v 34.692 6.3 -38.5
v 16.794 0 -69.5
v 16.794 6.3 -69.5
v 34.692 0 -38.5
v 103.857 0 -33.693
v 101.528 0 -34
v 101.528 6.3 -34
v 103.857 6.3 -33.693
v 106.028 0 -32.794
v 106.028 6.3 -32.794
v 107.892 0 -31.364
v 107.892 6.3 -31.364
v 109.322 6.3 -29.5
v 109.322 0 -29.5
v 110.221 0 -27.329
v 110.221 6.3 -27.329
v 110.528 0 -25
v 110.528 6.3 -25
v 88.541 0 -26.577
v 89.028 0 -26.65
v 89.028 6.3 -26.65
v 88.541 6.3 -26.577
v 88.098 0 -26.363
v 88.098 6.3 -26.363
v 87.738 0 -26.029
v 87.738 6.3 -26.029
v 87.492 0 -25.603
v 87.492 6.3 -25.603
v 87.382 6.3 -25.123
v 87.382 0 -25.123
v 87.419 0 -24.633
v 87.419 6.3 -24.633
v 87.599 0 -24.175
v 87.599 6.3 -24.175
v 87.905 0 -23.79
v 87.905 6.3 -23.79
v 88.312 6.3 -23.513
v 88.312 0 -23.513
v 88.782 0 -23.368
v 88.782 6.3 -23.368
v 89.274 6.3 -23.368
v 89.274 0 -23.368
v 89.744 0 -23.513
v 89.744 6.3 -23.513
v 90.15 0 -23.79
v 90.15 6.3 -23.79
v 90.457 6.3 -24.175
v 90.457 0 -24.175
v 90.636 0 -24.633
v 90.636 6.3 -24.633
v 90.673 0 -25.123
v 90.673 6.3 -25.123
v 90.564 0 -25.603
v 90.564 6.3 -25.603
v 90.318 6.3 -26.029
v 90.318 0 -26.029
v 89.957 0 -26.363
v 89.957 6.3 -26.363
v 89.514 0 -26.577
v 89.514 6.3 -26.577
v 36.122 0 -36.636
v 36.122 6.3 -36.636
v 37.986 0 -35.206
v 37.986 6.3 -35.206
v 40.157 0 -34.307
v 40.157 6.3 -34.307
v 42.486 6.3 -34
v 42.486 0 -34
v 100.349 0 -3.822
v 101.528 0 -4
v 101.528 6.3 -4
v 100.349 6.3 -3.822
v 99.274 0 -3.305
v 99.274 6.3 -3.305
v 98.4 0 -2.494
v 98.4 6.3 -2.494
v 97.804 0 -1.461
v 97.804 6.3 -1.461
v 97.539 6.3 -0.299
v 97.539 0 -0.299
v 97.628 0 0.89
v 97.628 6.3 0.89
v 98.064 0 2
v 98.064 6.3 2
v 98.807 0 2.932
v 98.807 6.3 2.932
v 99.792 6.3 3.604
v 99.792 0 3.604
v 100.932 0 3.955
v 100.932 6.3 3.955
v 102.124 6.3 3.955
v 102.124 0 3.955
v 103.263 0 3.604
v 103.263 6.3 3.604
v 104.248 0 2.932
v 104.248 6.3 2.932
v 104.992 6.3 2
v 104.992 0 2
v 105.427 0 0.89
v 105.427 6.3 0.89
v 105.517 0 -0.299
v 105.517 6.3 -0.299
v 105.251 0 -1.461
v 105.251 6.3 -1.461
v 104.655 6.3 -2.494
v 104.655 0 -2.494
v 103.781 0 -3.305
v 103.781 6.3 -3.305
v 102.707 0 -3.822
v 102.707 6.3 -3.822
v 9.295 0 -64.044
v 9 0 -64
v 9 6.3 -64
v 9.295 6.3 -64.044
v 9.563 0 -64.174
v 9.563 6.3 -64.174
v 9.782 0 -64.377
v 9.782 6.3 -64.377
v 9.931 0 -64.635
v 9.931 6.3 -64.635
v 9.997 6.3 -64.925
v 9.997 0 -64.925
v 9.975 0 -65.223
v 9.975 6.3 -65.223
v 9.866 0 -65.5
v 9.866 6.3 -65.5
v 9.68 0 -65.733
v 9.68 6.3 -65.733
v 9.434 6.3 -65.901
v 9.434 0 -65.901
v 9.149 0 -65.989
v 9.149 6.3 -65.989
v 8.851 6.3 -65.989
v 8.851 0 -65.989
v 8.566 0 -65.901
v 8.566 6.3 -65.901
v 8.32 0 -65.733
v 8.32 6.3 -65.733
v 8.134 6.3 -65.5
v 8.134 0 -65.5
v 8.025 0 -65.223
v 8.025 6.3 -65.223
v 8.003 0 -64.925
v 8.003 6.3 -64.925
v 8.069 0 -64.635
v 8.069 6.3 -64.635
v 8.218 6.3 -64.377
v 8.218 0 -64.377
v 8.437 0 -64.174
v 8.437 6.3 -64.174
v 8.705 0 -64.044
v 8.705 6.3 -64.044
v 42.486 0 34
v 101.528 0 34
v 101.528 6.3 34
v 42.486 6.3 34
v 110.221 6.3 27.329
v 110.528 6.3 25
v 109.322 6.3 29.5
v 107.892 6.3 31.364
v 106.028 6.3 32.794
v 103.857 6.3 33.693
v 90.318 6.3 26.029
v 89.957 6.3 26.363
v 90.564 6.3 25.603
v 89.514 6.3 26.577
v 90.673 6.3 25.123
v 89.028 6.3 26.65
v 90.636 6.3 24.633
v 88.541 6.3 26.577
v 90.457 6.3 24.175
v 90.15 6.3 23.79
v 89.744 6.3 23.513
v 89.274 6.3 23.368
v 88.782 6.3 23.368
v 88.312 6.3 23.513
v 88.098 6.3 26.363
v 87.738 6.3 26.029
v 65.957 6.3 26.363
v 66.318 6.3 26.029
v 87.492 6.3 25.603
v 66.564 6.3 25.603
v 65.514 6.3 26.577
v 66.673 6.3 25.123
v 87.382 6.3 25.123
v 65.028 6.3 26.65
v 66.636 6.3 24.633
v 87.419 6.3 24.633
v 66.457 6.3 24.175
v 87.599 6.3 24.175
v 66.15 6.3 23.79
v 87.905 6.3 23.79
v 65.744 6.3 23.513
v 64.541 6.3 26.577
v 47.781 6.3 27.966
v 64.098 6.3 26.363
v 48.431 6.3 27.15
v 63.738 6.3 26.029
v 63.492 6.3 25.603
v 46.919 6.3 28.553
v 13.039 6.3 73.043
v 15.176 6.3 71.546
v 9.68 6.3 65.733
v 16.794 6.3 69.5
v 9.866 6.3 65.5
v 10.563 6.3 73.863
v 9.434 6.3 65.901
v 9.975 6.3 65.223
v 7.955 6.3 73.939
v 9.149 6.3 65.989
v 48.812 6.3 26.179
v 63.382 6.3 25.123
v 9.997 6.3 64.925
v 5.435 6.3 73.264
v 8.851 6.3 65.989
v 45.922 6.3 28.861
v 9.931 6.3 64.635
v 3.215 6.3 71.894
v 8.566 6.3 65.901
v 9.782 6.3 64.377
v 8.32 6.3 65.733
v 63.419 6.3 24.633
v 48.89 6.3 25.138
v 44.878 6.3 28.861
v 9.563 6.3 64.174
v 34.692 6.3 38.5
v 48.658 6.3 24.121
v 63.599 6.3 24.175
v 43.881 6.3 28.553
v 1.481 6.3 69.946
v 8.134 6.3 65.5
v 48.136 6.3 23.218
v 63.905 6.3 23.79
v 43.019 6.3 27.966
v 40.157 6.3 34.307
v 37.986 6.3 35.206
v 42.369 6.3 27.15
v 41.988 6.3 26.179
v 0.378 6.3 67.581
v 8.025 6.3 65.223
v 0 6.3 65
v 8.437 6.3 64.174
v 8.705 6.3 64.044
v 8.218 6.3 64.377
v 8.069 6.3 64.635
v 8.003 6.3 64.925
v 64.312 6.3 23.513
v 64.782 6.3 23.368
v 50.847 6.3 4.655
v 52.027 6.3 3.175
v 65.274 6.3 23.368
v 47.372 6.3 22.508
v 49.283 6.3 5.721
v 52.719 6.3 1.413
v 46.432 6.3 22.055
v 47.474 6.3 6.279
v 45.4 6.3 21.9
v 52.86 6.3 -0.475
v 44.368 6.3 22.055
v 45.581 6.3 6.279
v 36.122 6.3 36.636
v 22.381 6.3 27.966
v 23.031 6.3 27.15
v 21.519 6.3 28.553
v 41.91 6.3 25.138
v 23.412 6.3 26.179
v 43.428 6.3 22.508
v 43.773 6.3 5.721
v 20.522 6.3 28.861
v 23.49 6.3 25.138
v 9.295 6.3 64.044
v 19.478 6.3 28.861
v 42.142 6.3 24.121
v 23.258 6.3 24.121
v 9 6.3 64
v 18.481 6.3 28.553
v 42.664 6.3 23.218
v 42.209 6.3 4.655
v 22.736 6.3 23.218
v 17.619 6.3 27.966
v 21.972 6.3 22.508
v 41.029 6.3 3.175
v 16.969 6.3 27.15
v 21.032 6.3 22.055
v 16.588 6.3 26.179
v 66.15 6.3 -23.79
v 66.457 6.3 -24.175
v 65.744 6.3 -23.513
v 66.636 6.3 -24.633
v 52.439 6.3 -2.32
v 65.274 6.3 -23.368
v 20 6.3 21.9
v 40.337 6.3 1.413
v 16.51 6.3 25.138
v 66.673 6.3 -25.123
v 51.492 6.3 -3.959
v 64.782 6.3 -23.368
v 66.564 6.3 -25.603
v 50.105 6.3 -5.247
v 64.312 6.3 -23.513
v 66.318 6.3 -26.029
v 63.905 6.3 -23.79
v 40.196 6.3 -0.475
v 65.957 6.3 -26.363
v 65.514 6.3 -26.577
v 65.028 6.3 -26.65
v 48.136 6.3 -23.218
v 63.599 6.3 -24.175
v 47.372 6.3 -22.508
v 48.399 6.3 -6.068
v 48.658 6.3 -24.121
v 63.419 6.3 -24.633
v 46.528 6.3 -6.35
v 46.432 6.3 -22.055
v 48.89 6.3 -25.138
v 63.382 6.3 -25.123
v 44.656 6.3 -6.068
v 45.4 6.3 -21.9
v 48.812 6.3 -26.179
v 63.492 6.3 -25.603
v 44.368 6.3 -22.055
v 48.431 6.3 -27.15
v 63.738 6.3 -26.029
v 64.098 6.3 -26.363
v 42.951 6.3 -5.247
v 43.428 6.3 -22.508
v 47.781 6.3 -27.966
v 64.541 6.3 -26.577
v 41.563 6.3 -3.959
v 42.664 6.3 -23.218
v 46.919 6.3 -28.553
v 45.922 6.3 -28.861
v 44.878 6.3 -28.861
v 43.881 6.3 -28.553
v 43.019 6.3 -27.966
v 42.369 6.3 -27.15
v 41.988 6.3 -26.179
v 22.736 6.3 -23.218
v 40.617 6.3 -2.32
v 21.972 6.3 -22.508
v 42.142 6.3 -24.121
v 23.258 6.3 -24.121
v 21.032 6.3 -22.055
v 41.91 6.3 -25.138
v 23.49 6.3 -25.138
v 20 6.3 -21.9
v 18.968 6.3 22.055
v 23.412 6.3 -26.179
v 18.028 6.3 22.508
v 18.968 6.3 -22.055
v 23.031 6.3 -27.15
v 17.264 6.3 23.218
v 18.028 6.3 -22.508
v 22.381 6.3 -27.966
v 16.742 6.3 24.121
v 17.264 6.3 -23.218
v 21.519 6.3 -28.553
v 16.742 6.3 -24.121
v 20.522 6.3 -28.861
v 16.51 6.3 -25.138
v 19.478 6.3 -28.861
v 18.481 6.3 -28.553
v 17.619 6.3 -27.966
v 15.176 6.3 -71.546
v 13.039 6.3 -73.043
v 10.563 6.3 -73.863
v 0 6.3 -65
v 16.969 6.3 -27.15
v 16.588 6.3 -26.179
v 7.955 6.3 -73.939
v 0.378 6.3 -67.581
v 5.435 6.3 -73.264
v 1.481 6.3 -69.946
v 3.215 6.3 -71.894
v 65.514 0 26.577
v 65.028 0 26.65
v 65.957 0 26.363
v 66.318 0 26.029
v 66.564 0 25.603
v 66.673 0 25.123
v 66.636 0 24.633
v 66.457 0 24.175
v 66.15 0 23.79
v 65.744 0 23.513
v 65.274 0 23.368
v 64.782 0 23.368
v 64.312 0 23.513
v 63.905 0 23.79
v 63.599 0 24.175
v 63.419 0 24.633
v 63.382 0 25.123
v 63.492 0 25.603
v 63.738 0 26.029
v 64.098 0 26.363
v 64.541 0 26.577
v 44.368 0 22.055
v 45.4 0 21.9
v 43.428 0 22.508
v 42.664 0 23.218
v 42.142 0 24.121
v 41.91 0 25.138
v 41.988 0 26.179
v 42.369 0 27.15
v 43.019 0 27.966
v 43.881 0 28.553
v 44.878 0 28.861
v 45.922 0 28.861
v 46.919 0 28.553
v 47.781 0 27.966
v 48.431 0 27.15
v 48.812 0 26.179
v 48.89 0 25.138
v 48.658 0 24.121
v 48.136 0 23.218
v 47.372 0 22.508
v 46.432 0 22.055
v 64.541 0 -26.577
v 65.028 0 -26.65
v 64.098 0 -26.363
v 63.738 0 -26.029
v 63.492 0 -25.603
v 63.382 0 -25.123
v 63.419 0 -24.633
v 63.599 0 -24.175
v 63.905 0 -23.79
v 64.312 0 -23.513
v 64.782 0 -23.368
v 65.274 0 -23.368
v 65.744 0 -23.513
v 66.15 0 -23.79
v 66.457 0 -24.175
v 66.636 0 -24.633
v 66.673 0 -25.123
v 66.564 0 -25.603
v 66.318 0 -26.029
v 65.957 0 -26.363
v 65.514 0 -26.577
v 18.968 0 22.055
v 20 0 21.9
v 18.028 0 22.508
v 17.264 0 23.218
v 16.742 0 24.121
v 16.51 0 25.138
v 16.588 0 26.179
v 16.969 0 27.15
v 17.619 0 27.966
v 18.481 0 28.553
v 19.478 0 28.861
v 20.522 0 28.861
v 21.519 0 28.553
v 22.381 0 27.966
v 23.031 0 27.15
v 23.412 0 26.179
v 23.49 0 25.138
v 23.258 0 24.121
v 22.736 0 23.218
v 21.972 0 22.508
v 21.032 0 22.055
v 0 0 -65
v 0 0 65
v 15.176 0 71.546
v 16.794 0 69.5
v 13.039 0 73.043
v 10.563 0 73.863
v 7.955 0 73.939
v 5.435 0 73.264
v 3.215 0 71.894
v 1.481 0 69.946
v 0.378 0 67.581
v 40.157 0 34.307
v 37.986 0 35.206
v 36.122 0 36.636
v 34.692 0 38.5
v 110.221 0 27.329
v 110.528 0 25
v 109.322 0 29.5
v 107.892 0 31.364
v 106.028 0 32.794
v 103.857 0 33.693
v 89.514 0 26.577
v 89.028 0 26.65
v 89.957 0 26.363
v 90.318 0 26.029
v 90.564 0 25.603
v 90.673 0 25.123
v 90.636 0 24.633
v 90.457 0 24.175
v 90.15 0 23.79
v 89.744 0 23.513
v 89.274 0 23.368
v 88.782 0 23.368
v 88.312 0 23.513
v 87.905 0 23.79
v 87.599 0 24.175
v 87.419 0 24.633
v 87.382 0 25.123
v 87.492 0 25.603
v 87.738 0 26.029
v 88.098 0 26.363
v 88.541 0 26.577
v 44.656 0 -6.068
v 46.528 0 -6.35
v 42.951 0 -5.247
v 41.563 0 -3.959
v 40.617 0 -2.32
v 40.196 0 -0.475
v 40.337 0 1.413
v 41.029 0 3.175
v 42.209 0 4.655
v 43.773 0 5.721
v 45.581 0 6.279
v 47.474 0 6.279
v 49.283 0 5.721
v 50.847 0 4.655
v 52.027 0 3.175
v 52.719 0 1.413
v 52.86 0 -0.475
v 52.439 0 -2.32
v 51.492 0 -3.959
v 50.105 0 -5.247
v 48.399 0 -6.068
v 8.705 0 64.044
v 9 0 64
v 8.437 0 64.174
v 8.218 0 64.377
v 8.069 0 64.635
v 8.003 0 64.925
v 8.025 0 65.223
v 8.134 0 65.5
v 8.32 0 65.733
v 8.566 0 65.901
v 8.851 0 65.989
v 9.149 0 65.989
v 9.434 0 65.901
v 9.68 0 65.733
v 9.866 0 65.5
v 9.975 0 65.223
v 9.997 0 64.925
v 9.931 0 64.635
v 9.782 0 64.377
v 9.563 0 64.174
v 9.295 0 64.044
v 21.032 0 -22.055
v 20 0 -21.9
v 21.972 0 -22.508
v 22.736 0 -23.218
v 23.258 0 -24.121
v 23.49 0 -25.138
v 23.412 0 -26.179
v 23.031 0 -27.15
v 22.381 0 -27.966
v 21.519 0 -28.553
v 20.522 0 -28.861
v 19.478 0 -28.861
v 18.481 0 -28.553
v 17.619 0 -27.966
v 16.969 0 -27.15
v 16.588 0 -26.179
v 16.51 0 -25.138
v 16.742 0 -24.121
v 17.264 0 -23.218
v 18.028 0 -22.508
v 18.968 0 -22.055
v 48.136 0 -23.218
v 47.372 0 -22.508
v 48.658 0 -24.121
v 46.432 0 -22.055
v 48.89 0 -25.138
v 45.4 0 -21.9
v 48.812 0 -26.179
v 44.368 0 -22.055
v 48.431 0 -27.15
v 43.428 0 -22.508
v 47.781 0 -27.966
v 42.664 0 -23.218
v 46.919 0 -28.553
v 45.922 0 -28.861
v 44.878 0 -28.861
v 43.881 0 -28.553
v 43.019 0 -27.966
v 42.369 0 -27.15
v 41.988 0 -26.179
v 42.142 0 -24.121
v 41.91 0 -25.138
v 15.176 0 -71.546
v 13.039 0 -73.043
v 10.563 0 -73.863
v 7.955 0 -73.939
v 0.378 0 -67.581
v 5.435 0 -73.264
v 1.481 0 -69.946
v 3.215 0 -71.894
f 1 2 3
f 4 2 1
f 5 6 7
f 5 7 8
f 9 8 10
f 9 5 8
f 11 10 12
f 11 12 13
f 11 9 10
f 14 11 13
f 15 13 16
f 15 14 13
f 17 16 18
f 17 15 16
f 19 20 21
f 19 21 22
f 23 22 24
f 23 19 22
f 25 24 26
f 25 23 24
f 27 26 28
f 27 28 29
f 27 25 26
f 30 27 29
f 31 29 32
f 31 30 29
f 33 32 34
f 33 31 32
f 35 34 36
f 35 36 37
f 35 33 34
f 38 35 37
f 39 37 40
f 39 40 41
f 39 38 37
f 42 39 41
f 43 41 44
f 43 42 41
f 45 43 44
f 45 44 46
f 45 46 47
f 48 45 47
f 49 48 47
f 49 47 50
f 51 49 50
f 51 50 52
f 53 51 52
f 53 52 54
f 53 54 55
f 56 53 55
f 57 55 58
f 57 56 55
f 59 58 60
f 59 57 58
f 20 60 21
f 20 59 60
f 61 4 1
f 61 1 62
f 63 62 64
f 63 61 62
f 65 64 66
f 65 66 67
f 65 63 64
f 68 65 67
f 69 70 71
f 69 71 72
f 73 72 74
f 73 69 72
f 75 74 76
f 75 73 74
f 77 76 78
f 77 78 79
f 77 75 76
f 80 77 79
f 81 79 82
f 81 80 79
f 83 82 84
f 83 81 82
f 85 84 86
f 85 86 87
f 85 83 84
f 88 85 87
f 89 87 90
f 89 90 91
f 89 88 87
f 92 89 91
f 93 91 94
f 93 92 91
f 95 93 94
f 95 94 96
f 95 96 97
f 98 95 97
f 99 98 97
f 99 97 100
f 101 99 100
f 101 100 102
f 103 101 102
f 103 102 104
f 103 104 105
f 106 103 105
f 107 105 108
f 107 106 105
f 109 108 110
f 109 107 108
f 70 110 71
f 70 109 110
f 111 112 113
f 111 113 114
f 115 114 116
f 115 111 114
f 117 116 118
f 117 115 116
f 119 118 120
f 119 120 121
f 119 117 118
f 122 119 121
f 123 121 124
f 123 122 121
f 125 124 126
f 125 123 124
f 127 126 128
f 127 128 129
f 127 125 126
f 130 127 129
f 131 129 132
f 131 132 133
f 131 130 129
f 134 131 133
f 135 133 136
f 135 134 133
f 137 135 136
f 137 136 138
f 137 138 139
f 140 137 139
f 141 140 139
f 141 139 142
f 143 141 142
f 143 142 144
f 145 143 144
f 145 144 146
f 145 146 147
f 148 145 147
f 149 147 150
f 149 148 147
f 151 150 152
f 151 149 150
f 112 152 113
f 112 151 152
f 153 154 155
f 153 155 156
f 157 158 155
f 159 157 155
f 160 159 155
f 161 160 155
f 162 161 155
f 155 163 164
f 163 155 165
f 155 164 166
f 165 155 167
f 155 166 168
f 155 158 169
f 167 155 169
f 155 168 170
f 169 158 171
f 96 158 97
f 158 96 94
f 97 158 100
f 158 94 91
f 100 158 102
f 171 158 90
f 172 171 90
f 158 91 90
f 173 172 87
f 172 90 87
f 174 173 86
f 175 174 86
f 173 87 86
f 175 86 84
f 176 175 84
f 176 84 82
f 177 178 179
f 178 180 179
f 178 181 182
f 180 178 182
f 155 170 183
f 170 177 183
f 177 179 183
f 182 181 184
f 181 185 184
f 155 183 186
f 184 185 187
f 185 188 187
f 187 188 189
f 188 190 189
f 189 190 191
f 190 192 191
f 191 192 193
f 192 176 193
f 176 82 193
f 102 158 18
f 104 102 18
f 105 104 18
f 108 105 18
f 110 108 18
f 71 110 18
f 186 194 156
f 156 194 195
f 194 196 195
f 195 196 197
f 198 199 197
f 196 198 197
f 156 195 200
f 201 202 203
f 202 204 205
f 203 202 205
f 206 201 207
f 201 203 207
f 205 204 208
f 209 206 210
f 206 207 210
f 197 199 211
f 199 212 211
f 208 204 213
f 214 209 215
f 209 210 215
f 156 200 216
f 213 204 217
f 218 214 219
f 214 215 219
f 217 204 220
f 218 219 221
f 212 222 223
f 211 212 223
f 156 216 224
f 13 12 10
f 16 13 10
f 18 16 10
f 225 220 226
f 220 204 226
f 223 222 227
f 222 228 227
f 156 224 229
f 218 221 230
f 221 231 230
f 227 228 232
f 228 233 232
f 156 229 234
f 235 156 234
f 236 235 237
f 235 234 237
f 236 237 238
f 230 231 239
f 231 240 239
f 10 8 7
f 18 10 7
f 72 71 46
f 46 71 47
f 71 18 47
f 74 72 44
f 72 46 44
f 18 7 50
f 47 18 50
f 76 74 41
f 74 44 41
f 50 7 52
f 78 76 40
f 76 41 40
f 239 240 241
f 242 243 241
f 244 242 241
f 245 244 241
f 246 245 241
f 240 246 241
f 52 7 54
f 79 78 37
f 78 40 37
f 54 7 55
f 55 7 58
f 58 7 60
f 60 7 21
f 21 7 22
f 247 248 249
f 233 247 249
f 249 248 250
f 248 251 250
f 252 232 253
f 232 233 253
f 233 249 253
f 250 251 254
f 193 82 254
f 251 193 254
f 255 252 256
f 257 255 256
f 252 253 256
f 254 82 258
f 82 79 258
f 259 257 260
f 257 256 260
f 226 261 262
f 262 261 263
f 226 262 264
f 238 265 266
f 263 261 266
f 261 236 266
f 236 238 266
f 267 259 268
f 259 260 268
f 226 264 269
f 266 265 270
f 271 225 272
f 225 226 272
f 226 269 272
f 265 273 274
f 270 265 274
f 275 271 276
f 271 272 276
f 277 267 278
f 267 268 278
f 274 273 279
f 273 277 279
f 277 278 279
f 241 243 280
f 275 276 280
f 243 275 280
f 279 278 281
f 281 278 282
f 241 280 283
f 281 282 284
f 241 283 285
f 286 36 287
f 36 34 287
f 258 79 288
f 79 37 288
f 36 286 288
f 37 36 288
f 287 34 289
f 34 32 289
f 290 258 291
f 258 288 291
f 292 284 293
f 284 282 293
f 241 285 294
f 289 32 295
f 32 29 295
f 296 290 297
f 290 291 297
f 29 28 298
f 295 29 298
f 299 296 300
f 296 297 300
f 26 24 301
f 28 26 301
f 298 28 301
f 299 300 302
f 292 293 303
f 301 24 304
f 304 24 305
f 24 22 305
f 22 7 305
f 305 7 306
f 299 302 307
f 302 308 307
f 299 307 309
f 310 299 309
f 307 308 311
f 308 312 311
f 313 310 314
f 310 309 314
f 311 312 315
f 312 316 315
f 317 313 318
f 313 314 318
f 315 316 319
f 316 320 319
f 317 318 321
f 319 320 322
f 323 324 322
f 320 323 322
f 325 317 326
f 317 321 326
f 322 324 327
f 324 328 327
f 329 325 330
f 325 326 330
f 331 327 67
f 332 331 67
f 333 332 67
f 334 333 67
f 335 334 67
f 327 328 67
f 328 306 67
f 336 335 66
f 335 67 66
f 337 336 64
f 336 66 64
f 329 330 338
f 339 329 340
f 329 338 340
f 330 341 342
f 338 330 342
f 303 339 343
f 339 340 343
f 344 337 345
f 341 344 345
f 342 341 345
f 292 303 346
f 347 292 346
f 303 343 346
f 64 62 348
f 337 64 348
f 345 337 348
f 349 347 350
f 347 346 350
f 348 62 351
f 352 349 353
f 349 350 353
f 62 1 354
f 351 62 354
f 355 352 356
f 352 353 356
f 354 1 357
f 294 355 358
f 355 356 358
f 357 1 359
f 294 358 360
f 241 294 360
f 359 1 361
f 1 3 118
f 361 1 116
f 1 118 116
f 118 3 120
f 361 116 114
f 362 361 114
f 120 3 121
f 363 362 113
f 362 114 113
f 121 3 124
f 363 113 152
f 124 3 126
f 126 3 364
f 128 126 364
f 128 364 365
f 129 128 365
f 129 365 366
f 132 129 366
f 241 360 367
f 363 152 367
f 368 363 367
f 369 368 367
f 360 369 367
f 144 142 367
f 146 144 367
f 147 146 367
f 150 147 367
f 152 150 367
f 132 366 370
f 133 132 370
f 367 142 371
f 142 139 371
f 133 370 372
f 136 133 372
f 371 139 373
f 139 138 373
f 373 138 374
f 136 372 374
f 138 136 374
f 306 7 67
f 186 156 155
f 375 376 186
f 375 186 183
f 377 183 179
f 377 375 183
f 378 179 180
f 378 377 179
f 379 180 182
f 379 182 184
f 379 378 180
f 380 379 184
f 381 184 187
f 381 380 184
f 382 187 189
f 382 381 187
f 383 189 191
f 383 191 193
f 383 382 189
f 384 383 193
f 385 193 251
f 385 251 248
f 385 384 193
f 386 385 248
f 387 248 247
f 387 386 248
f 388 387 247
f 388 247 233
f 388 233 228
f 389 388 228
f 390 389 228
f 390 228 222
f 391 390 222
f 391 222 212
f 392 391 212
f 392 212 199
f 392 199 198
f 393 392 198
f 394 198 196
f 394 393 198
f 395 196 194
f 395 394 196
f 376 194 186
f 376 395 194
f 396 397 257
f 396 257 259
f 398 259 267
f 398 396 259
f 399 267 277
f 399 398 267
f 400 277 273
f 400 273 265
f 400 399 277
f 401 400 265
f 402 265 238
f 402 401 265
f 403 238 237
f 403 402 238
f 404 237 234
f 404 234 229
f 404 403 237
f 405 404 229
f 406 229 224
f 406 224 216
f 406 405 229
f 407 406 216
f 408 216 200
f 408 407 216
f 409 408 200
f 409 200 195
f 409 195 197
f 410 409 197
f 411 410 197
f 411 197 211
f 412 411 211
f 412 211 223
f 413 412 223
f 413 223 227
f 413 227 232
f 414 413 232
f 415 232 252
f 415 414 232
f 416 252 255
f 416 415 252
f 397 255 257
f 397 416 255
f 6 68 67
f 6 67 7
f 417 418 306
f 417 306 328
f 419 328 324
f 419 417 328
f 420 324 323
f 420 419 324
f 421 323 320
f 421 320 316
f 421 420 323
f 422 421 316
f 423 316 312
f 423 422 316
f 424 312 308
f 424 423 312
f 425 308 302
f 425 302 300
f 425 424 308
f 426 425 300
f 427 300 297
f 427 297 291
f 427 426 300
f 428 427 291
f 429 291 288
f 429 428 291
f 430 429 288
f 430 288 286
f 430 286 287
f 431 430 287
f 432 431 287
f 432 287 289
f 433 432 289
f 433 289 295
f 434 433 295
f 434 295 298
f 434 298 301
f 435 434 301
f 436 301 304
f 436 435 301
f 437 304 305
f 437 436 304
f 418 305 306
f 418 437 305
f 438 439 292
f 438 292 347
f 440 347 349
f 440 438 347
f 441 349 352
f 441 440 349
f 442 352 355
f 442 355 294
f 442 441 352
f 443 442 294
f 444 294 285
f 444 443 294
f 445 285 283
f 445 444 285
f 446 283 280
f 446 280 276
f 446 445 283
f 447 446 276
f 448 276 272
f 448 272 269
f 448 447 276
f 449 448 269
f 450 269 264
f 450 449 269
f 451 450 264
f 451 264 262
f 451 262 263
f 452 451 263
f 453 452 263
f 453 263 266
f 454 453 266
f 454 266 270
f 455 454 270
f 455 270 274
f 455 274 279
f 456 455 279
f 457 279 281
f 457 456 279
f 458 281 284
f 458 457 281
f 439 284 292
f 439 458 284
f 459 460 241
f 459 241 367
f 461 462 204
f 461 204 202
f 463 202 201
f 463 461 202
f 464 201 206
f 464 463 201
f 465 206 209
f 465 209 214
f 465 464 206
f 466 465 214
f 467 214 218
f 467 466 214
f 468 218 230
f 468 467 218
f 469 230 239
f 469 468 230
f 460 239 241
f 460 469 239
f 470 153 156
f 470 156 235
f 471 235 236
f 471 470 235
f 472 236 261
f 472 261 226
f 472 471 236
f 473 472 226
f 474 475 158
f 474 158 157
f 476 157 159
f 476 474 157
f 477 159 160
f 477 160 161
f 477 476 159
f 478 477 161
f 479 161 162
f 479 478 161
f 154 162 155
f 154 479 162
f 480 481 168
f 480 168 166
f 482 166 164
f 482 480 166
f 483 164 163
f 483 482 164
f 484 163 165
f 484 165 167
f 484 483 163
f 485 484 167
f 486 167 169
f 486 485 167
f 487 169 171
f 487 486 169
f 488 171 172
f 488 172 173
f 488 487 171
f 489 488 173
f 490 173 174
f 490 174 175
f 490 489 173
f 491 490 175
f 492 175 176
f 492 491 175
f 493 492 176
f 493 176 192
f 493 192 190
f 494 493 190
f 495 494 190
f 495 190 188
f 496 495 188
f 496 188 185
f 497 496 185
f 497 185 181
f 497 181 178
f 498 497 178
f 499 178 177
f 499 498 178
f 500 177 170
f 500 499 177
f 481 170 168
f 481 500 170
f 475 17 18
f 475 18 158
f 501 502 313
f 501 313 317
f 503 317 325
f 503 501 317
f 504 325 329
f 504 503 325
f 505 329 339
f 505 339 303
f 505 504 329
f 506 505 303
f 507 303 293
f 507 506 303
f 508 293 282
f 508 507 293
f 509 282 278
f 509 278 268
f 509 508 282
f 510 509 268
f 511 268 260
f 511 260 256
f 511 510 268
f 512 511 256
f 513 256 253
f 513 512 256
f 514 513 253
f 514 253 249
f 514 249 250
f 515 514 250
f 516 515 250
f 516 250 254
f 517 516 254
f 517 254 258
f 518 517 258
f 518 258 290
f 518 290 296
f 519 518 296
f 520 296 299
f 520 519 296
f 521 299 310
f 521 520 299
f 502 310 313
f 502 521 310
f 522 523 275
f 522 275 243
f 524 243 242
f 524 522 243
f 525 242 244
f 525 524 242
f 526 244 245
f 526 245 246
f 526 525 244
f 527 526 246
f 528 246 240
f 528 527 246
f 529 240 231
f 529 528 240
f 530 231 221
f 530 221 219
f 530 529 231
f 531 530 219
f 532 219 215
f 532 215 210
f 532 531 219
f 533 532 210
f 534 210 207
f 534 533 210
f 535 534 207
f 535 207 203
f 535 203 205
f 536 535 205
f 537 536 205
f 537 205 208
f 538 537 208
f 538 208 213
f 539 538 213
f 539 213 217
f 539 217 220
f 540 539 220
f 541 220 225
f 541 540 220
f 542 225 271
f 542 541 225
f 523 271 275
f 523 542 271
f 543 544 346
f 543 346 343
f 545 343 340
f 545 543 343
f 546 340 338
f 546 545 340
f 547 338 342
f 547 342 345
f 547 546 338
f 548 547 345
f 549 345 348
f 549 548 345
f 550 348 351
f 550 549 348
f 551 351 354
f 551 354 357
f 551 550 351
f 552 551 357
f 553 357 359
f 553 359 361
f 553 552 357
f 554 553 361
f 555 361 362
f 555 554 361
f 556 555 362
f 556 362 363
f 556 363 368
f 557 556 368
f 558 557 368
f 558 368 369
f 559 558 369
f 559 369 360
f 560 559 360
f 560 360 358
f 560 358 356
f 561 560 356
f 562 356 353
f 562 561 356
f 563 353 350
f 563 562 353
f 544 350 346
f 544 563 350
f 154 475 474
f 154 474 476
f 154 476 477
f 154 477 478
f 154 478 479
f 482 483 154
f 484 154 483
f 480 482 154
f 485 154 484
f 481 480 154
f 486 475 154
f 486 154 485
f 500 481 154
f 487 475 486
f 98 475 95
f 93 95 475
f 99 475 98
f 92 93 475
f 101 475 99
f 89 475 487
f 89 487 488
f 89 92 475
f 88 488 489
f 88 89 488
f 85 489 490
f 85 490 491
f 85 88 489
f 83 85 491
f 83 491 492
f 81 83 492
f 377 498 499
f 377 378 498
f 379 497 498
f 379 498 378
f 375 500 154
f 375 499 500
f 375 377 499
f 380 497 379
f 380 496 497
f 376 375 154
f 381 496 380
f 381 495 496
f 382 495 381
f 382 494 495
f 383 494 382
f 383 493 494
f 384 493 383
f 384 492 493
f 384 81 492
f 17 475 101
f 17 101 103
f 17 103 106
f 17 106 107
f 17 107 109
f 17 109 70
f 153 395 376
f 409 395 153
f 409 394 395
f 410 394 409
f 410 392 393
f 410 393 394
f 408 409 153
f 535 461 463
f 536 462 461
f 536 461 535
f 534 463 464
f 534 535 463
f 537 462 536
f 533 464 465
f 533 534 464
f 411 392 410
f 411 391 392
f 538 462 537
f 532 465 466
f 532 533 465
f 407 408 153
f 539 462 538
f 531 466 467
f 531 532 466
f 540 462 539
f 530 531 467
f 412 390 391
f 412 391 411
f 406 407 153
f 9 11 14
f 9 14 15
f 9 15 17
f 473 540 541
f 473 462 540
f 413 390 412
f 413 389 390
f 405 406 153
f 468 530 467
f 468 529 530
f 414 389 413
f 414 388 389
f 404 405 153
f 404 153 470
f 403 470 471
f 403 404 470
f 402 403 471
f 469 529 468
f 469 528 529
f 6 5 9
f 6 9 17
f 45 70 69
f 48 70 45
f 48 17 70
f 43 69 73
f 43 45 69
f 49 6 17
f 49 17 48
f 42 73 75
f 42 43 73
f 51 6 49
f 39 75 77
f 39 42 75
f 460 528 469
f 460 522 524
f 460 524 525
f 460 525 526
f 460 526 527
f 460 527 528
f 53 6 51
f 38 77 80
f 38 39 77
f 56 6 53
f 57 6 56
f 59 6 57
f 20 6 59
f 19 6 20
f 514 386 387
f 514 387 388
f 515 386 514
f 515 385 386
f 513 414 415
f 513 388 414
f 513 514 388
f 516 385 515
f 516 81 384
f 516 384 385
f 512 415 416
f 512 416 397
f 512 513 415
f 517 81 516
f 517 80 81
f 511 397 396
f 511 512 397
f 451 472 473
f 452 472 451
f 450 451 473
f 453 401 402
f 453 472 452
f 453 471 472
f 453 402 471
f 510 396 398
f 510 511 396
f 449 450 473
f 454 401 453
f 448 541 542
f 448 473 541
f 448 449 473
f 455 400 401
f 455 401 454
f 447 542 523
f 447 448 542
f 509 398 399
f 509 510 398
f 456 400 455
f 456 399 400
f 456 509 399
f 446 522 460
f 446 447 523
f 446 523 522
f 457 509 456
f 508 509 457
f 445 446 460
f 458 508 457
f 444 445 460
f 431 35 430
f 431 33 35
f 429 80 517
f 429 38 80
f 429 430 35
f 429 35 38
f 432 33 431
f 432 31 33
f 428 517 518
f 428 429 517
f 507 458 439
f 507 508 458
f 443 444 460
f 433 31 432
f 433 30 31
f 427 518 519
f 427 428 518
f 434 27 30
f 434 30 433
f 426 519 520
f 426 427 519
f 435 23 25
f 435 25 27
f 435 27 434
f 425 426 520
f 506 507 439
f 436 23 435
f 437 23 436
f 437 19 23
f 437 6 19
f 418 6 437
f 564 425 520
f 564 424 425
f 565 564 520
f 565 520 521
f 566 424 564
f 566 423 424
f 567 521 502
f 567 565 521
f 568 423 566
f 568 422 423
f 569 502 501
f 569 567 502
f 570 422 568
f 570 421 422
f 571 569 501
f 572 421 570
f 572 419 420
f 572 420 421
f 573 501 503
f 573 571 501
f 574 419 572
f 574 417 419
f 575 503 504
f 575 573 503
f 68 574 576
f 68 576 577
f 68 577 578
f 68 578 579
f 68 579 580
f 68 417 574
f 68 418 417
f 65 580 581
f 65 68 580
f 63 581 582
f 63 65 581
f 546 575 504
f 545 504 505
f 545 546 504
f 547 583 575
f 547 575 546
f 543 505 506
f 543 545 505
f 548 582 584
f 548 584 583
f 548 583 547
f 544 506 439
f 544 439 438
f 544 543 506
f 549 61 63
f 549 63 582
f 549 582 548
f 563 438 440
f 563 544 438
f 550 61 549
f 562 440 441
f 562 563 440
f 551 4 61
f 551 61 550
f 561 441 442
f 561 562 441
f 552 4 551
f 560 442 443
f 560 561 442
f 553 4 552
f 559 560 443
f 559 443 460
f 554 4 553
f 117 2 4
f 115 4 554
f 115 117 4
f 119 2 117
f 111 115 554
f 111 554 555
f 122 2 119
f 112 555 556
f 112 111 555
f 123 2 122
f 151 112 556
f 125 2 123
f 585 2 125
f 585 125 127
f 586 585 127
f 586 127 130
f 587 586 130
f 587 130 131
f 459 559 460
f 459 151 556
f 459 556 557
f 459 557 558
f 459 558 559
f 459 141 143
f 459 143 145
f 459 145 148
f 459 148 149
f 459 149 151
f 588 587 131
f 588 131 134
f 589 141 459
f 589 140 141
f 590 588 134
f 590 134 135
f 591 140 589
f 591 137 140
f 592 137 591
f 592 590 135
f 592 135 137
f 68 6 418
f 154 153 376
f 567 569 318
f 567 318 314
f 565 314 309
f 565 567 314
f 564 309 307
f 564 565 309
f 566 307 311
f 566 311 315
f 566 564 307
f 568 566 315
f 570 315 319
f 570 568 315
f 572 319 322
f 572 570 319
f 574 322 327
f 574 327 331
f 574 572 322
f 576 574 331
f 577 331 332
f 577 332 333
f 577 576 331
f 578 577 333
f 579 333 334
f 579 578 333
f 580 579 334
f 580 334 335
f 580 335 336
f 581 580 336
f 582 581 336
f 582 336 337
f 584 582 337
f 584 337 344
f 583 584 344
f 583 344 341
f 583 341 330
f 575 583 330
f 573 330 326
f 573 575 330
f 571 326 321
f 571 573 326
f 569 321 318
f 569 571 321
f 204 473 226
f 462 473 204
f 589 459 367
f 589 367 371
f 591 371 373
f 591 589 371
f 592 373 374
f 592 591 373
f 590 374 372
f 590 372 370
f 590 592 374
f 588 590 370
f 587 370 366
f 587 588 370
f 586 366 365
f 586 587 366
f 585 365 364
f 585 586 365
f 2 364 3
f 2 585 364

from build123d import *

# Parameters (mm, degrees)
SKETCH1_R           = 1
SKETCH1_R_2         = 6.35
SKETCH1_R_3         = 4
SKETCH1_R_4         = 3.5
SKETCH1_R_5         = 1.65
BOSS_EXTRUDE3_DEPTH = 6.3


with BuildPart() as part:
    # Sketch1 → Boss-Extrude3 (new body)
    with BuildSketch(Plane(origin=(0, 0, 0), x_dir=(1, 0, 0), z_dir=(0, 1, 0))):
        with BuildLine():
            Line((0, -65), (0, 65))
            ThreePointArc((0, 65), (6.670628594, 73.693332437), (16.794228634, 69.5))
            Line((16.794228634, 69.5), (34.692086979, 38.5))
            ThreePointArc((34.692086979, 38.5), (37.986315613, 35.205771366), (42.486315613, 34))
            Line((42.486315613, 34), (101.527767497, 34))
            ThreePointArc((101.527767497, 34), (107.891728528, 31.363961031), (110.527767497, 25))
            Line((110.527767497, 25), (110.527767497, -25))
            ThreePointArc((110.527767497, -25), (107.891728528, -31.363961031), (101.527767497, -34))
            Line((101.527767497, -34), (42.486315613, -34))
            ThreePointArc((42.486315613, -34), (37.986315613, -35.205771366), (34.692086979, -38.5))
            Line((34.692086979, -38.5), (16.794228634, -69.5))
            ThreePointArc((16.794228634, -69.5), (6.670628594, -73.693332437), (0, -65))
        make_face()
        with Locations(Location((9, 65, 0), (0, 0, 270))):
            Circle(SKETCH1_R, mode=Mode.SUBTRACT)
        with Locations(Location((46.527767497, 0, 0), (0, 0, 90))):
            Circle(SKETCH1_R_2, mode=Mode.SUBTRACT)
        with Locations(Location((101.527767497, 0, 0), (0, 0, 90))):
            Circle(SKETCH1_R_3, mode=Mode.SUBTRACT)
        with Locations(Location((20, 25.4, 0), (0, 0, 270))):
            Circle(SKETCH1_R_4, mode=Mode.SUBTRACT)
        with Locations(Location((45.4, 25.4, 0), (0, 0, 270))):
            Circle(SKETCH1_R_4, mode=Mode.SUBTRACT)
        with Locations(Location((45.4, -25.4, 0), (0, 0, 90))):
            Circle(SKETCH1_R_4, mode=Mode.SUBTRACT)
        with Locations(Location((20, -25.4, 0), (0, 0, 90))):
            Circle(SKETCH1_R_4, mode=Mode.SUBTRACT)
        with Locations(Location((9, -65, 0), (0, 0, 90))):
            Circle(SKETCH1_R, mode=Mode.SUBTRACT)
        with Locations(Location((89.027767497, -25, 0), (0, 0, 270))):
            Circle(SKETCH1_R_5, mode=Mode.SUBTRACT)
        with Locations(Location((65.027767497, -25, 0), (0, 0, 270))):
            Circle(SKETCH1_R_5, mode=Mode.SUBTRACT)
        with Locations(Location((65.027767497, 25, 0), (0, 0, 90))):
            Circle(SKETCH1_R_5, mode=Mode.SUBTRACT)
        with Locations(Location((89.027767497, 25, 0), (0, 0, 90))):
            Circle(SKETCH1_R_5, mode=Mode.SUBTRACT)
    extrude(amount=BOSS_EXTRUDE3_DEPTH)


solid = part.part
